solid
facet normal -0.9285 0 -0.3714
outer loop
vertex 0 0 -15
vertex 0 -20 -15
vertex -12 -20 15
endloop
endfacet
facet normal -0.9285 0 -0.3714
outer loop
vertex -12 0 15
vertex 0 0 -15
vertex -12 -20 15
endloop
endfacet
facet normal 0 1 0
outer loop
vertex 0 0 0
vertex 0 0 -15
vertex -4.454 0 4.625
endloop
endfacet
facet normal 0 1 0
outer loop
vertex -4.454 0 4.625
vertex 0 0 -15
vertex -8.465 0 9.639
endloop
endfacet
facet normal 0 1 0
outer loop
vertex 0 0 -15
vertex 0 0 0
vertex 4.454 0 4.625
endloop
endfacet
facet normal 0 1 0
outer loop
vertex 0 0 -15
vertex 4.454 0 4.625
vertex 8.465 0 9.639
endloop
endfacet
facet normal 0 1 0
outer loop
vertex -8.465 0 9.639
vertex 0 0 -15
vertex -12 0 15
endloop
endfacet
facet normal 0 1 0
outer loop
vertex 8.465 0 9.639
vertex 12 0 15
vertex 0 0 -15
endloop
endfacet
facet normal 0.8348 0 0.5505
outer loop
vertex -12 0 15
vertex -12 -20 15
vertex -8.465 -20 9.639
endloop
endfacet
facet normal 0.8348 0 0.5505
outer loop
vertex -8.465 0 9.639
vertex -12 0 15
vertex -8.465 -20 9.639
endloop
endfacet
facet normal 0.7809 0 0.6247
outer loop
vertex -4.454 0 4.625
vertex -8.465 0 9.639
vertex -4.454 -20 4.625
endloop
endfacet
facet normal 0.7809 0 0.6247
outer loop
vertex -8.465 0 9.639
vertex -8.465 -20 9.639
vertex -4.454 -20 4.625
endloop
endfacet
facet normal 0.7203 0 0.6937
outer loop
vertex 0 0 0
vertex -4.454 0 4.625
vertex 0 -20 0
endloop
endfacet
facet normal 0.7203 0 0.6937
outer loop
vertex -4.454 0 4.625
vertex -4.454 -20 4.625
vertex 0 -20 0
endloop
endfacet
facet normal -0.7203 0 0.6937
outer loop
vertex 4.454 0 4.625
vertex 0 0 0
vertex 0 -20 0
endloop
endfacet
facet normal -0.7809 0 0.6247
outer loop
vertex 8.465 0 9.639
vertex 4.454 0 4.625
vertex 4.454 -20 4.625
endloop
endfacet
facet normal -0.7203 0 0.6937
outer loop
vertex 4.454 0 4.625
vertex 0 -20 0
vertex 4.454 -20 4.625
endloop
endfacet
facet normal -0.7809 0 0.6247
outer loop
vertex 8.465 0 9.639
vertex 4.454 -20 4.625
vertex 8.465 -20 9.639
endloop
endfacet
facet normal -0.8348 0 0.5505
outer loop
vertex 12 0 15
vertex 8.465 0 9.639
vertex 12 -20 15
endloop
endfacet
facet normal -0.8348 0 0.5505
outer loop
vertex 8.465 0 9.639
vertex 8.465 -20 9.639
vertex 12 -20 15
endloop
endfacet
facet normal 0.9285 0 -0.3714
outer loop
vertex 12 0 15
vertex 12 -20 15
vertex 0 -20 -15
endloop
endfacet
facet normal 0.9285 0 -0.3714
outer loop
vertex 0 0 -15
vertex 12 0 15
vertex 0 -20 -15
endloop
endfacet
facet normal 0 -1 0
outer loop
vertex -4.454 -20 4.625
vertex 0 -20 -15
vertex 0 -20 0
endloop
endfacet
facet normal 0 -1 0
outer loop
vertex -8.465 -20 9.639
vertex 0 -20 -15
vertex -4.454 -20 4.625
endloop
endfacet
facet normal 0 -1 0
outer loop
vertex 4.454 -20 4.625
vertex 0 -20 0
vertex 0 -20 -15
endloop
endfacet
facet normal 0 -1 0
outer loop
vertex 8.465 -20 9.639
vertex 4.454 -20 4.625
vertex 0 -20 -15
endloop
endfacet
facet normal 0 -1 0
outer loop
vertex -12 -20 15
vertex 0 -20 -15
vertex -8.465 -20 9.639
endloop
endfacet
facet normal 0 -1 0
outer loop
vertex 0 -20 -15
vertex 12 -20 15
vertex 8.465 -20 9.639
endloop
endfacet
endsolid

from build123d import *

# Parameters (mm, degrees)
F0_W     = 24
F0_H     = 30
F1_DEPTH = 20
F3_DEPTH = 25
F5_DEPTH = 25


with BuildPart() as f1:
    # F0 (on Front) → F1 (new body)
    with BuildSketch(Plane.XZ):
        Rectangle(F0_W, F0_H)
    extrude(amount=F1_DEPTH)

    # F2 (on face) → F3 (cut)
    with BuildSketch(Plane.XZ.offset(20)):
        with BuildLine():
            ThreePointArc((-12, 15), (-6.516982, 7.086415), (0, 0))
            ThreePointArc((0, 0), (6.516982, 7.086415), (12, 15))
            Line((12, 15), (-12, 15))
        make_face()
    extrude(amount=-F3_DEPTH, mode=Mode.SUBTRACT)

    # F4 (on face) → F5 (cut)
    with BuildSketch(Plane.XZ.offset(20)):
        Polygon((12, 15), (0, -15), (12, -15), align=None)
        Polygon((0, -15), (-12, 15), (-12, -15), align=None)
    extrude(amount=-F5_DEPTH, mode=Mode.SUBTRACT)


solid = f1.part
